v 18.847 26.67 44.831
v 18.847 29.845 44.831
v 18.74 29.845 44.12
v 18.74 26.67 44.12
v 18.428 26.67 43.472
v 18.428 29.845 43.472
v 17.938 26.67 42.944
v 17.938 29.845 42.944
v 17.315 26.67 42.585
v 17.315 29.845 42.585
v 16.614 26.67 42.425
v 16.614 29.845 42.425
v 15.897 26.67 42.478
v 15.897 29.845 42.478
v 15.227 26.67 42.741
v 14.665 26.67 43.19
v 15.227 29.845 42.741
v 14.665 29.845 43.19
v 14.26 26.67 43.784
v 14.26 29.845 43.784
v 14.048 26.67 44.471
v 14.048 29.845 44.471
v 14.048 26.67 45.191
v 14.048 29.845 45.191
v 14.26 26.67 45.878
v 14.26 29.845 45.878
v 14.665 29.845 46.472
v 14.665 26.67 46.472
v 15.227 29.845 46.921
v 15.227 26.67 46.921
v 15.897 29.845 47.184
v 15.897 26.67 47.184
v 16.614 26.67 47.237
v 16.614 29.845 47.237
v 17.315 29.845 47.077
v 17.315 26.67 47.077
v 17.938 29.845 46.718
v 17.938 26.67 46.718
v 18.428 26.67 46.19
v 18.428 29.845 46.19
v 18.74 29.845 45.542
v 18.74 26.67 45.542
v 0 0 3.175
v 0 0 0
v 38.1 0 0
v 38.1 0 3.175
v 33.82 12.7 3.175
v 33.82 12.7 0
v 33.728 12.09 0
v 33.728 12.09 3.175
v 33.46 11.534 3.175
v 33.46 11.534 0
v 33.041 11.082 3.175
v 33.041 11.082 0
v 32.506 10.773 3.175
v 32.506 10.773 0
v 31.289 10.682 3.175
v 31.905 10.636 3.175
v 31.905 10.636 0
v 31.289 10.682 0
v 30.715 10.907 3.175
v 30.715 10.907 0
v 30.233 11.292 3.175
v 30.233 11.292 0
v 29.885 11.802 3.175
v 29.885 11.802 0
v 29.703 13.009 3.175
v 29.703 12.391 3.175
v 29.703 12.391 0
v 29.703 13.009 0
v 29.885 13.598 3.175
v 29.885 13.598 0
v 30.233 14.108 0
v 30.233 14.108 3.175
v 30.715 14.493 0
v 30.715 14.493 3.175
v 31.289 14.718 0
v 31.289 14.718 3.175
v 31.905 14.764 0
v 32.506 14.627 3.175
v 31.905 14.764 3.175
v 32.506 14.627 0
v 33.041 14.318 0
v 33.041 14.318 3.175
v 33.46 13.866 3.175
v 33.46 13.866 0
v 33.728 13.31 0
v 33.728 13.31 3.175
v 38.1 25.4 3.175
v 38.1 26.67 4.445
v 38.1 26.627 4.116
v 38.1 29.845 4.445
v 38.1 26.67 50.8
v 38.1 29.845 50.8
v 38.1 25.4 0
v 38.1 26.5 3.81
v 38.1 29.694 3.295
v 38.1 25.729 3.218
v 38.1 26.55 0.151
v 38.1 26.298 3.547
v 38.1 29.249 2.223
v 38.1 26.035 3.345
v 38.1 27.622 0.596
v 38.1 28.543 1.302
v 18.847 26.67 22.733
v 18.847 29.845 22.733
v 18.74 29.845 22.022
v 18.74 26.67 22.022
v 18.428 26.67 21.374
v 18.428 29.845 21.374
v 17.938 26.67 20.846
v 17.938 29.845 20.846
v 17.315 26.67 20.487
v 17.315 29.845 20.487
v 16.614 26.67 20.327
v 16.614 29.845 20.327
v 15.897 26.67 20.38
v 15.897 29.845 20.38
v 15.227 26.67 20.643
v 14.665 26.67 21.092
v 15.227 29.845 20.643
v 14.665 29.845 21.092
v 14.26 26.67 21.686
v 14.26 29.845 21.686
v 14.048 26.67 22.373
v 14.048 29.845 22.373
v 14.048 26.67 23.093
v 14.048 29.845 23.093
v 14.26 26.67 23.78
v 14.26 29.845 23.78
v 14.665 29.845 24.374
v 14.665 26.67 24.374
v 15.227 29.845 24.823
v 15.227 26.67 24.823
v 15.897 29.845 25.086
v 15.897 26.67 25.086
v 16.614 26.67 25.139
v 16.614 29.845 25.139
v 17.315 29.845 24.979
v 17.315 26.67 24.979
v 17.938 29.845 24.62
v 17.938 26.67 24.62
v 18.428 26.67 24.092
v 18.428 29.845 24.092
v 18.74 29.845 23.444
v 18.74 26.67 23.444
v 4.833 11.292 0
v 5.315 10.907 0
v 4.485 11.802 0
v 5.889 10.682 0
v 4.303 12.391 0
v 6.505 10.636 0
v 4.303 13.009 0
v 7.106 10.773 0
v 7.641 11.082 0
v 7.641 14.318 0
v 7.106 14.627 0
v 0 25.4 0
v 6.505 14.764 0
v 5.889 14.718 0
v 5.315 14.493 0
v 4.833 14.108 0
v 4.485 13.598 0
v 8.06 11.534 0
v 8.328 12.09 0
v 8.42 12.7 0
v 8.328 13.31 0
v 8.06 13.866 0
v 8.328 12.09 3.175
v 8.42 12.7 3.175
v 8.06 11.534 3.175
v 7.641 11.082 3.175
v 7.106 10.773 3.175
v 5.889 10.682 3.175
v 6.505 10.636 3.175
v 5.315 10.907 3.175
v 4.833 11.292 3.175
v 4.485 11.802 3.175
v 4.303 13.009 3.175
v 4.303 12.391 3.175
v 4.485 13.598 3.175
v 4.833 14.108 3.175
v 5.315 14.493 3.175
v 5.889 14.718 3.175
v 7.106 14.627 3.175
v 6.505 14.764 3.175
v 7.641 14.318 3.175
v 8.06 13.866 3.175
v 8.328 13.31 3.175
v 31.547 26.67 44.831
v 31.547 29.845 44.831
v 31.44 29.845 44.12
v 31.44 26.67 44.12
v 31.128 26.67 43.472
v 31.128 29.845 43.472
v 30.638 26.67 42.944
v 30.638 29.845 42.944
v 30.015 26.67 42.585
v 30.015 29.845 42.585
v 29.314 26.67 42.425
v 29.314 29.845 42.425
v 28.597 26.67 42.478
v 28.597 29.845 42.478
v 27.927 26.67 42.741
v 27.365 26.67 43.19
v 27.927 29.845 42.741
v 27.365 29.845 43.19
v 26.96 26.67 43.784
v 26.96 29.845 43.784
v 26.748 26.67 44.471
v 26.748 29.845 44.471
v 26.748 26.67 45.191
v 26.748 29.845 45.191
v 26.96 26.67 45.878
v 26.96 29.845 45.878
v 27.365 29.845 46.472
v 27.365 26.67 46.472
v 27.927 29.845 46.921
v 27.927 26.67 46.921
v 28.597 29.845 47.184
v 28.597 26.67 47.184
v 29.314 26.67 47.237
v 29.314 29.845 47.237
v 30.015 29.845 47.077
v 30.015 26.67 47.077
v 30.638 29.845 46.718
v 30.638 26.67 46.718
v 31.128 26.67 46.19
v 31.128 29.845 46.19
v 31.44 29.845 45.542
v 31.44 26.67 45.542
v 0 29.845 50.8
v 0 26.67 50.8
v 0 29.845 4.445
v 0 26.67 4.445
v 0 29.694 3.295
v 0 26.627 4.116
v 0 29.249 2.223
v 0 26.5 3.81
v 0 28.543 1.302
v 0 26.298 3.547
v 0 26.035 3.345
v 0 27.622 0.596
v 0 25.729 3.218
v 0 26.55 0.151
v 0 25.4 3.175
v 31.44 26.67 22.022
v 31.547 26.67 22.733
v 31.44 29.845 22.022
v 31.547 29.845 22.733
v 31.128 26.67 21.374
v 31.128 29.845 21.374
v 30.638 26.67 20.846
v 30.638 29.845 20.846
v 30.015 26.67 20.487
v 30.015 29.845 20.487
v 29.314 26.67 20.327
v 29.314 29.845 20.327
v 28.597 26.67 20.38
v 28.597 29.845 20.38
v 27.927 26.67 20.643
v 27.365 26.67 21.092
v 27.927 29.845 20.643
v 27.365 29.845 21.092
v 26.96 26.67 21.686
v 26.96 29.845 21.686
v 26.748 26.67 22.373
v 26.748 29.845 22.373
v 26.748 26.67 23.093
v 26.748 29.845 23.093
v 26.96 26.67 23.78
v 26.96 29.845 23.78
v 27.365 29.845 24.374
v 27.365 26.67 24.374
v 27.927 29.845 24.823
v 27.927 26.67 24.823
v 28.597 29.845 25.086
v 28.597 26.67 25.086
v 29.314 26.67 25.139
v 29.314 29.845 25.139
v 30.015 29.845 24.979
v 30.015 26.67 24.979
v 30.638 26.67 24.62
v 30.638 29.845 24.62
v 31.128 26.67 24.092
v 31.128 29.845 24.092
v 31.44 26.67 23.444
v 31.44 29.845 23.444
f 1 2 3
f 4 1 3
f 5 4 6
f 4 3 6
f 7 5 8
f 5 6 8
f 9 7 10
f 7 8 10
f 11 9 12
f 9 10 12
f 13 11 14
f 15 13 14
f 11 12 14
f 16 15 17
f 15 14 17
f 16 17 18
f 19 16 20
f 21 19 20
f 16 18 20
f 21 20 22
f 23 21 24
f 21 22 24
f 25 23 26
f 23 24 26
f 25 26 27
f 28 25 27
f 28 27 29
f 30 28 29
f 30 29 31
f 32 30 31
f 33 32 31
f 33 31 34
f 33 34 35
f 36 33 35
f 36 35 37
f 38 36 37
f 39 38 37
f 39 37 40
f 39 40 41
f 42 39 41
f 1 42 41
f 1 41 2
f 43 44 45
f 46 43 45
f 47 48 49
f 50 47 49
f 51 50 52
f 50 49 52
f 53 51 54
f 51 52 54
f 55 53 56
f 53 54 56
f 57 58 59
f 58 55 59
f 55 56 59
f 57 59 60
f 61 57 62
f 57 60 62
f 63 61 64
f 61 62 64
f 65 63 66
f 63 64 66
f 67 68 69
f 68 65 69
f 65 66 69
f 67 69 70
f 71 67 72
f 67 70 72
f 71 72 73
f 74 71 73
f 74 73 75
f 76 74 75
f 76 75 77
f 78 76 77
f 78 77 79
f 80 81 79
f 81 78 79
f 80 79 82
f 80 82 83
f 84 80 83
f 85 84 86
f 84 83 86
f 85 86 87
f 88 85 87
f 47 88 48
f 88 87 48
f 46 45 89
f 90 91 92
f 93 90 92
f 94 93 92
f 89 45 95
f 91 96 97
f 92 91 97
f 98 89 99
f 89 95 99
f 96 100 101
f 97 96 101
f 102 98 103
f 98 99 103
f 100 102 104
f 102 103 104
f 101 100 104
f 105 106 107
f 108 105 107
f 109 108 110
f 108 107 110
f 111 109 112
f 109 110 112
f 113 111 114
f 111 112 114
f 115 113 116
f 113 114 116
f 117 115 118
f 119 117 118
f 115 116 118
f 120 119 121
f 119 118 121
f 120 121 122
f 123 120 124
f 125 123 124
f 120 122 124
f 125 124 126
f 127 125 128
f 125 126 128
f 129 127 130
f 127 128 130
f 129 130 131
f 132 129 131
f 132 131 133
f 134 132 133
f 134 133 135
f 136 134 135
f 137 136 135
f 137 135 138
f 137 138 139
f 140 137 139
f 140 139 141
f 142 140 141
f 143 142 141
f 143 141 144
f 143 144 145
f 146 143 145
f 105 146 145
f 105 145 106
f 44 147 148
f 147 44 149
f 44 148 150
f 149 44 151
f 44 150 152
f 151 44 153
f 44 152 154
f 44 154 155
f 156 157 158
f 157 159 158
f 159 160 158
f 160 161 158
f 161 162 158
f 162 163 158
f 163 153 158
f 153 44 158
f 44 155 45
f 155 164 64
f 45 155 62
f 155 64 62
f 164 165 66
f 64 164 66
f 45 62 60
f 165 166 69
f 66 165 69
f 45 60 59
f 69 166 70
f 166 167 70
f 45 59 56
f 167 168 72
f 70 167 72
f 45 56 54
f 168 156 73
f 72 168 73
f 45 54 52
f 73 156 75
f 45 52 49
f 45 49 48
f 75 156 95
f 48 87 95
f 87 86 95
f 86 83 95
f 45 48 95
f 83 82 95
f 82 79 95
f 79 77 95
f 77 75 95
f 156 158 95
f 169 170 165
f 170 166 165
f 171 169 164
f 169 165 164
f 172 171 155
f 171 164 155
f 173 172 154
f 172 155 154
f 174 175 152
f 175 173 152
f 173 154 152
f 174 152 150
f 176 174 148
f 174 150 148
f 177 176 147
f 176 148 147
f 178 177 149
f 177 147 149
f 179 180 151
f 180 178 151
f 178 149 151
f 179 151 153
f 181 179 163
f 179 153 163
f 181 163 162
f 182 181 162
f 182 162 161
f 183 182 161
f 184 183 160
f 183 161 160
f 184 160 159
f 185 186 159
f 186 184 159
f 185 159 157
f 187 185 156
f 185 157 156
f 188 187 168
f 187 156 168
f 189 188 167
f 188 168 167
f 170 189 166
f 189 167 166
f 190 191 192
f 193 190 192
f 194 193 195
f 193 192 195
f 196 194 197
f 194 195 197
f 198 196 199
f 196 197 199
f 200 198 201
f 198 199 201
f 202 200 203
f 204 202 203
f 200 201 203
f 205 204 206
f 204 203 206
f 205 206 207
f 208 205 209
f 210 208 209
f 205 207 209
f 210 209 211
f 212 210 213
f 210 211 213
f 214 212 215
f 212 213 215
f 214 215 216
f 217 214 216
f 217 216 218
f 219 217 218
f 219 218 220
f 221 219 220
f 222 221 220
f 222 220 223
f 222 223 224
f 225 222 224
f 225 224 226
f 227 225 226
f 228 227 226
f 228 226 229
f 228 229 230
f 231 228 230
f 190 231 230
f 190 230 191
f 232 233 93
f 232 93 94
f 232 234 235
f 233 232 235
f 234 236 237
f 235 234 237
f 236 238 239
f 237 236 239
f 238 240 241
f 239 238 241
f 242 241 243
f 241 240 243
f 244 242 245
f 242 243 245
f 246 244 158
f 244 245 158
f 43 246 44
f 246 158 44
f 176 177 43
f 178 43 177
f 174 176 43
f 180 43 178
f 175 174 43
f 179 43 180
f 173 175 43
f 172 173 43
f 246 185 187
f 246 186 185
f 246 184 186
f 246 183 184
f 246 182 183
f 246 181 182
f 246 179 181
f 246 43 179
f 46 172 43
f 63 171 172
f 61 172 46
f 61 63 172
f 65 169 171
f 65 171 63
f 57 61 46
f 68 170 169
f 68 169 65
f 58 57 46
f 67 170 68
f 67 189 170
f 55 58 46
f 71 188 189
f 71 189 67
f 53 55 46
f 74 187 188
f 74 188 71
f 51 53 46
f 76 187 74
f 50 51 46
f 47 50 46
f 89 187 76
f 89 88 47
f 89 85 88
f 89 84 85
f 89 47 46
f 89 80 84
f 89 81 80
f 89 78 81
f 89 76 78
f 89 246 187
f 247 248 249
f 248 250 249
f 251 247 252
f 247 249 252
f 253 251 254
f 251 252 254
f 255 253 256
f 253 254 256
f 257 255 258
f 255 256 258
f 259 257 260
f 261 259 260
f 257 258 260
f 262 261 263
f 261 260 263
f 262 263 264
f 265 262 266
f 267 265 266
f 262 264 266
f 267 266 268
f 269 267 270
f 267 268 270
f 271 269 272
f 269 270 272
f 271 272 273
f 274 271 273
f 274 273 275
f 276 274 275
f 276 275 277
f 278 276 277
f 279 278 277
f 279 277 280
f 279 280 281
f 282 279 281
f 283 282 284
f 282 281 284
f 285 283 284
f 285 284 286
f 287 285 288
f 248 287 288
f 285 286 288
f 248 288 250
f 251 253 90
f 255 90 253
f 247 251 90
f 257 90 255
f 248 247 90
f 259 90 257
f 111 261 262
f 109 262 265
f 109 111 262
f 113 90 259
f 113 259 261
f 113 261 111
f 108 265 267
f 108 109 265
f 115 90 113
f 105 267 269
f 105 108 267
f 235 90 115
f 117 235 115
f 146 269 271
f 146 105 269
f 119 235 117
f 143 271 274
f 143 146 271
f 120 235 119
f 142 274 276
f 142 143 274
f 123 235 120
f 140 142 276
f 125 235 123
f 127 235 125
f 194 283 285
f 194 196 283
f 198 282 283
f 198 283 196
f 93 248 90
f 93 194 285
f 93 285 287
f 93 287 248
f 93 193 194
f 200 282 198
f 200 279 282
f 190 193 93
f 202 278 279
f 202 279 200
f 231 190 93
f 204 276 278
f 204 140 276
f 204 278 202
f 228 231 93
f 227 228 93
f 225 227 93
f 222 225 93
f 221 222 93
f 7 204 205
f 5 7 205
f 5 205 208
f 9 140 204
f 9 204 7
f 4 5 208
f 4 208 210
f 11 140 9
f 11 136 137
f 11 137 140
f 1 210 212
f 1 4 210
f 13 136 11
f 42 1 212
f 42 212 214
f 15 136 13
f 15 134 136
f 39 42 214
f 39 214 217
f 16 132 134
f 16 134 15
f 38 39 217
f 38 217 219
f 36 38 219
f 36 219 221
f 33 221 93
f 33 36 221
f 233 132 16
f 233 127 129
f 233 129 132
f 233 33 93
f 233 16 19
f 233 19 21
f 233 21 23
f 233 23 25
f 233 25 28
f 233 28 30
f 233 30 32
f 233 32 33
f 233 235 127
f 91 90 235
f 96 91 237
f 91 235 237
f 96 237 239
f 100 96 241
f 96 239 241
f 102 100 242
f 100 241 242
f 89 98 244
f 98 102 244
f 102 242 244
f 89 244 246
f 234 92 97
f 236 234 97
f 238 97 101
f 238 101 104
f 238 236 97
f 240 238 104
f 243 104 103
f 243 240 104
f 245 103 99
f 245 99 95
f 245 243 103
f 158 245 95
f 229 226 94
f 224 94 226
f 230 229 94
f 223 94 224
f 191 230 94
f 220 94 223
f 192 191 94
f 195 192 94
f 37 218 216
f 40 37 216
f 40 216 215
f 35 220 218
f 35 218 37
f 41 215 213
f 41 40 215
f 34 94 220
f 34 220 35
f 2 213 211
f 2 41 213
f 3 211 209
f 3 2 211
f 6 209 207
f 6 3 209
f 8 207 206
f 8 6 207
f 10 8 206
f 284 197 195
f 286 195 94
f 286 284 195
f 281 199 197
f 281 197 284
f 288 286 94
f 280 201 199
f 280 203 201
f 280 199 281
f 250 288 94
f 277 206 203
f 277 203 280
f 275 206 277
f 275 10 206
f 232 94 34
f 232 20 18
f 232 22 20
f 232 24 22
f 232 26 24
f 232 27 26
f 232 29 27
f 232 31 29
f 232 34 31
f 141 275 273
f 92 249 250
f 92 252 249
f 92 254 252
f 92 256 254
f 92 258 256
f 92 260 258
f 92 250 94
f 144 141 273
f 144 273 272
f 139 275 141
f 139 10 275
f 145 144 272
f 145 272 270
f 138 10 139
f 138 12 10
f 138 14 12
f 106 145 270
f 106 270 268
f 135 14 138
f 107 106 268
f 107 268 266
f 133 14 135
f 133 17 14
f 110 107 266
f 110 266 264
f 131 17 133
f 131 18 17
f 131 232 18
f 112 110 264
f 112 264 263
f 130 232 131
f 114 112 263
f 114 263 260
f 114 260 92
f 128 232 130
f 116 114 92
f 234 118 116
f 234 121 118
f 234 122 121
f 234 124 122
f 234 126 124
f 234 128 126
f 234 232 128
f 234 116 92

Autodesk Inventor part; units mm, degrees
ref_plane "YZ Plane" through (0, 0, 0) normal (1, 0, 0) x (0, 1, 0)
ref_plane "XZ Plane" through (0, 0, 0) normal (0, 1, 0) x (-1, 0, 0)
ref_plane "XY Plane" through (0, 0, 0) normal (0, 0, 1) x (1, 0, 0)
sketch "Sketch1" plane through (0, 0, 0) normal (0, 0, 1) x (1, 0, 0)
  line L0 (0, 0) -> (38.1, 0)
  line L1 (38.1, 0) -> (38.1, 25.4)
  line L2 (38.1, 25.4) -> (0, 25.4)
  line L3 (0, 25.4) -> (0, 0)
  circle A0 centre (6.35, 12.7) radius 2.0701
  circle A1 centre (31.75, 12.7) radius 2.0701
  dimension "d0" = 38.1
  dimension "d1" = 25.4
  dimension "d2" = 4.1402
  dimension "d3" = 12.7
  dimension "d4" = 6.35
  dimension "d7" = 25.4
extrude "Plate1" add sketch "Sketch1" along normal blind 3.175
sketch "Sketch2" plane through (0, 26.67, 4.445) normal (0, 1, 0) x (-1, 0, 0)
  line L0 (-38.1, 0) -> (0, 0)
  line L1 (0, 0) -> (0, 46.355)
  line L2 (0, 46.355) -> (-38.1, 46.355)
  line L3 (-38.1, 46.355) -> (-38.1, 0)
edge flange "Flange1" height 50.8 angle 90 thickness 3.175 bend radius 1.27 thickness toward (0, 1, 0) relief tear relief width 3.175 relief depth 1.5875 edges at (19.05, 25.4, 3.175) wall of the first edge with corners at (38.1, 26.67, 4.445) (0, 26.67, 4.445) (0, 26.67, 50.8) (38.1, 26.67, 50.8)
bend "Bend1"
corner "Corner1"
sketch "Sketch3" plane through (0, 29.845, 50.8) normal (0, 1, 0) x (1, 0, 0)
  line L0 (38.1, 46.355) -> (0, 46.355) projected
  line L1 (32.3088, 33.655) -> (13.2588, 33.655) construction
  line L2 (13.2588, 33.655) -> (13.2588, 0.381) construction
  line L3 (13.2588, 0.381) -> (32.3088, 0.381) construction
  line L4 (32.3088, 0.381) -> (32.3088, 33.655) construction
  line L5 (32.3088, 5.969) -> (13.2588, 5.969) construction
  circle A0 centre (29.1338, 5.969) radius 2.413
  line L6 (22.7838, 0.381) -> (22.7838, 33.655) construction
  circle A1 centre (16.4338, 5.969) radius 2.413
  line L7 (32.3088, 17.018) -> (13.2588, 17.018) construction
  circle A2 centre (29.1338, 28.067) radius 2.413
  circle A3 centre (16.4338, 28.067) radius 2.413
  line L8 (0, 0) -> (0, 46.355) projected
  point P0 (0, 50.8)
  dimension "d23" = 19.05
  dimension "d24" = 33.274
  dimension "d25" = 5.588
  dimension "d26" = 3.175
  dimension "d27" = 4.826
  dimension "d29" = 12.7
  dimension "d32" = 13.2588
extrude "Cut1" cut sketch "Sketch3" against normal blind 3.175
equation "\"d30\" = Thickness"
equation "\"d13\" = BendReliefWidth"
equation "\"d14\" = BendReliefDepth"
equation "\"d15\" = MinimumRemnant"
equation "\"d16\" = BendRadius"
equation "\"d20\" = CornerReliefSize"
equation "\"d21\" = GapSize"
equation "\"d22\" = JacobiRadiusSize"
equation "\"BendRadius\" = Thickness"
equation "\"BendReliefWidth\" = Thickness"
equation "\"BendReliefDepth\" = 0.5 * Thickness"
equation "\"CornerReliefSize\" = 4 * Thickness"
equation "\"MinimumRemnant\" = 2 * Thickness"
equation "\"TransitionRadius\" = BendRadius"
equation "\"JacobiRadiusSize\" = BendRadius"
equation "\"GapSize\" = Thickness"
equation "\"d12\" = BendRadius"
equation "\"Thickness\" = 3.175"
properties part number "Pneumatic Piston Back Flange (Left Custom)" material "Aluminum 6061"
